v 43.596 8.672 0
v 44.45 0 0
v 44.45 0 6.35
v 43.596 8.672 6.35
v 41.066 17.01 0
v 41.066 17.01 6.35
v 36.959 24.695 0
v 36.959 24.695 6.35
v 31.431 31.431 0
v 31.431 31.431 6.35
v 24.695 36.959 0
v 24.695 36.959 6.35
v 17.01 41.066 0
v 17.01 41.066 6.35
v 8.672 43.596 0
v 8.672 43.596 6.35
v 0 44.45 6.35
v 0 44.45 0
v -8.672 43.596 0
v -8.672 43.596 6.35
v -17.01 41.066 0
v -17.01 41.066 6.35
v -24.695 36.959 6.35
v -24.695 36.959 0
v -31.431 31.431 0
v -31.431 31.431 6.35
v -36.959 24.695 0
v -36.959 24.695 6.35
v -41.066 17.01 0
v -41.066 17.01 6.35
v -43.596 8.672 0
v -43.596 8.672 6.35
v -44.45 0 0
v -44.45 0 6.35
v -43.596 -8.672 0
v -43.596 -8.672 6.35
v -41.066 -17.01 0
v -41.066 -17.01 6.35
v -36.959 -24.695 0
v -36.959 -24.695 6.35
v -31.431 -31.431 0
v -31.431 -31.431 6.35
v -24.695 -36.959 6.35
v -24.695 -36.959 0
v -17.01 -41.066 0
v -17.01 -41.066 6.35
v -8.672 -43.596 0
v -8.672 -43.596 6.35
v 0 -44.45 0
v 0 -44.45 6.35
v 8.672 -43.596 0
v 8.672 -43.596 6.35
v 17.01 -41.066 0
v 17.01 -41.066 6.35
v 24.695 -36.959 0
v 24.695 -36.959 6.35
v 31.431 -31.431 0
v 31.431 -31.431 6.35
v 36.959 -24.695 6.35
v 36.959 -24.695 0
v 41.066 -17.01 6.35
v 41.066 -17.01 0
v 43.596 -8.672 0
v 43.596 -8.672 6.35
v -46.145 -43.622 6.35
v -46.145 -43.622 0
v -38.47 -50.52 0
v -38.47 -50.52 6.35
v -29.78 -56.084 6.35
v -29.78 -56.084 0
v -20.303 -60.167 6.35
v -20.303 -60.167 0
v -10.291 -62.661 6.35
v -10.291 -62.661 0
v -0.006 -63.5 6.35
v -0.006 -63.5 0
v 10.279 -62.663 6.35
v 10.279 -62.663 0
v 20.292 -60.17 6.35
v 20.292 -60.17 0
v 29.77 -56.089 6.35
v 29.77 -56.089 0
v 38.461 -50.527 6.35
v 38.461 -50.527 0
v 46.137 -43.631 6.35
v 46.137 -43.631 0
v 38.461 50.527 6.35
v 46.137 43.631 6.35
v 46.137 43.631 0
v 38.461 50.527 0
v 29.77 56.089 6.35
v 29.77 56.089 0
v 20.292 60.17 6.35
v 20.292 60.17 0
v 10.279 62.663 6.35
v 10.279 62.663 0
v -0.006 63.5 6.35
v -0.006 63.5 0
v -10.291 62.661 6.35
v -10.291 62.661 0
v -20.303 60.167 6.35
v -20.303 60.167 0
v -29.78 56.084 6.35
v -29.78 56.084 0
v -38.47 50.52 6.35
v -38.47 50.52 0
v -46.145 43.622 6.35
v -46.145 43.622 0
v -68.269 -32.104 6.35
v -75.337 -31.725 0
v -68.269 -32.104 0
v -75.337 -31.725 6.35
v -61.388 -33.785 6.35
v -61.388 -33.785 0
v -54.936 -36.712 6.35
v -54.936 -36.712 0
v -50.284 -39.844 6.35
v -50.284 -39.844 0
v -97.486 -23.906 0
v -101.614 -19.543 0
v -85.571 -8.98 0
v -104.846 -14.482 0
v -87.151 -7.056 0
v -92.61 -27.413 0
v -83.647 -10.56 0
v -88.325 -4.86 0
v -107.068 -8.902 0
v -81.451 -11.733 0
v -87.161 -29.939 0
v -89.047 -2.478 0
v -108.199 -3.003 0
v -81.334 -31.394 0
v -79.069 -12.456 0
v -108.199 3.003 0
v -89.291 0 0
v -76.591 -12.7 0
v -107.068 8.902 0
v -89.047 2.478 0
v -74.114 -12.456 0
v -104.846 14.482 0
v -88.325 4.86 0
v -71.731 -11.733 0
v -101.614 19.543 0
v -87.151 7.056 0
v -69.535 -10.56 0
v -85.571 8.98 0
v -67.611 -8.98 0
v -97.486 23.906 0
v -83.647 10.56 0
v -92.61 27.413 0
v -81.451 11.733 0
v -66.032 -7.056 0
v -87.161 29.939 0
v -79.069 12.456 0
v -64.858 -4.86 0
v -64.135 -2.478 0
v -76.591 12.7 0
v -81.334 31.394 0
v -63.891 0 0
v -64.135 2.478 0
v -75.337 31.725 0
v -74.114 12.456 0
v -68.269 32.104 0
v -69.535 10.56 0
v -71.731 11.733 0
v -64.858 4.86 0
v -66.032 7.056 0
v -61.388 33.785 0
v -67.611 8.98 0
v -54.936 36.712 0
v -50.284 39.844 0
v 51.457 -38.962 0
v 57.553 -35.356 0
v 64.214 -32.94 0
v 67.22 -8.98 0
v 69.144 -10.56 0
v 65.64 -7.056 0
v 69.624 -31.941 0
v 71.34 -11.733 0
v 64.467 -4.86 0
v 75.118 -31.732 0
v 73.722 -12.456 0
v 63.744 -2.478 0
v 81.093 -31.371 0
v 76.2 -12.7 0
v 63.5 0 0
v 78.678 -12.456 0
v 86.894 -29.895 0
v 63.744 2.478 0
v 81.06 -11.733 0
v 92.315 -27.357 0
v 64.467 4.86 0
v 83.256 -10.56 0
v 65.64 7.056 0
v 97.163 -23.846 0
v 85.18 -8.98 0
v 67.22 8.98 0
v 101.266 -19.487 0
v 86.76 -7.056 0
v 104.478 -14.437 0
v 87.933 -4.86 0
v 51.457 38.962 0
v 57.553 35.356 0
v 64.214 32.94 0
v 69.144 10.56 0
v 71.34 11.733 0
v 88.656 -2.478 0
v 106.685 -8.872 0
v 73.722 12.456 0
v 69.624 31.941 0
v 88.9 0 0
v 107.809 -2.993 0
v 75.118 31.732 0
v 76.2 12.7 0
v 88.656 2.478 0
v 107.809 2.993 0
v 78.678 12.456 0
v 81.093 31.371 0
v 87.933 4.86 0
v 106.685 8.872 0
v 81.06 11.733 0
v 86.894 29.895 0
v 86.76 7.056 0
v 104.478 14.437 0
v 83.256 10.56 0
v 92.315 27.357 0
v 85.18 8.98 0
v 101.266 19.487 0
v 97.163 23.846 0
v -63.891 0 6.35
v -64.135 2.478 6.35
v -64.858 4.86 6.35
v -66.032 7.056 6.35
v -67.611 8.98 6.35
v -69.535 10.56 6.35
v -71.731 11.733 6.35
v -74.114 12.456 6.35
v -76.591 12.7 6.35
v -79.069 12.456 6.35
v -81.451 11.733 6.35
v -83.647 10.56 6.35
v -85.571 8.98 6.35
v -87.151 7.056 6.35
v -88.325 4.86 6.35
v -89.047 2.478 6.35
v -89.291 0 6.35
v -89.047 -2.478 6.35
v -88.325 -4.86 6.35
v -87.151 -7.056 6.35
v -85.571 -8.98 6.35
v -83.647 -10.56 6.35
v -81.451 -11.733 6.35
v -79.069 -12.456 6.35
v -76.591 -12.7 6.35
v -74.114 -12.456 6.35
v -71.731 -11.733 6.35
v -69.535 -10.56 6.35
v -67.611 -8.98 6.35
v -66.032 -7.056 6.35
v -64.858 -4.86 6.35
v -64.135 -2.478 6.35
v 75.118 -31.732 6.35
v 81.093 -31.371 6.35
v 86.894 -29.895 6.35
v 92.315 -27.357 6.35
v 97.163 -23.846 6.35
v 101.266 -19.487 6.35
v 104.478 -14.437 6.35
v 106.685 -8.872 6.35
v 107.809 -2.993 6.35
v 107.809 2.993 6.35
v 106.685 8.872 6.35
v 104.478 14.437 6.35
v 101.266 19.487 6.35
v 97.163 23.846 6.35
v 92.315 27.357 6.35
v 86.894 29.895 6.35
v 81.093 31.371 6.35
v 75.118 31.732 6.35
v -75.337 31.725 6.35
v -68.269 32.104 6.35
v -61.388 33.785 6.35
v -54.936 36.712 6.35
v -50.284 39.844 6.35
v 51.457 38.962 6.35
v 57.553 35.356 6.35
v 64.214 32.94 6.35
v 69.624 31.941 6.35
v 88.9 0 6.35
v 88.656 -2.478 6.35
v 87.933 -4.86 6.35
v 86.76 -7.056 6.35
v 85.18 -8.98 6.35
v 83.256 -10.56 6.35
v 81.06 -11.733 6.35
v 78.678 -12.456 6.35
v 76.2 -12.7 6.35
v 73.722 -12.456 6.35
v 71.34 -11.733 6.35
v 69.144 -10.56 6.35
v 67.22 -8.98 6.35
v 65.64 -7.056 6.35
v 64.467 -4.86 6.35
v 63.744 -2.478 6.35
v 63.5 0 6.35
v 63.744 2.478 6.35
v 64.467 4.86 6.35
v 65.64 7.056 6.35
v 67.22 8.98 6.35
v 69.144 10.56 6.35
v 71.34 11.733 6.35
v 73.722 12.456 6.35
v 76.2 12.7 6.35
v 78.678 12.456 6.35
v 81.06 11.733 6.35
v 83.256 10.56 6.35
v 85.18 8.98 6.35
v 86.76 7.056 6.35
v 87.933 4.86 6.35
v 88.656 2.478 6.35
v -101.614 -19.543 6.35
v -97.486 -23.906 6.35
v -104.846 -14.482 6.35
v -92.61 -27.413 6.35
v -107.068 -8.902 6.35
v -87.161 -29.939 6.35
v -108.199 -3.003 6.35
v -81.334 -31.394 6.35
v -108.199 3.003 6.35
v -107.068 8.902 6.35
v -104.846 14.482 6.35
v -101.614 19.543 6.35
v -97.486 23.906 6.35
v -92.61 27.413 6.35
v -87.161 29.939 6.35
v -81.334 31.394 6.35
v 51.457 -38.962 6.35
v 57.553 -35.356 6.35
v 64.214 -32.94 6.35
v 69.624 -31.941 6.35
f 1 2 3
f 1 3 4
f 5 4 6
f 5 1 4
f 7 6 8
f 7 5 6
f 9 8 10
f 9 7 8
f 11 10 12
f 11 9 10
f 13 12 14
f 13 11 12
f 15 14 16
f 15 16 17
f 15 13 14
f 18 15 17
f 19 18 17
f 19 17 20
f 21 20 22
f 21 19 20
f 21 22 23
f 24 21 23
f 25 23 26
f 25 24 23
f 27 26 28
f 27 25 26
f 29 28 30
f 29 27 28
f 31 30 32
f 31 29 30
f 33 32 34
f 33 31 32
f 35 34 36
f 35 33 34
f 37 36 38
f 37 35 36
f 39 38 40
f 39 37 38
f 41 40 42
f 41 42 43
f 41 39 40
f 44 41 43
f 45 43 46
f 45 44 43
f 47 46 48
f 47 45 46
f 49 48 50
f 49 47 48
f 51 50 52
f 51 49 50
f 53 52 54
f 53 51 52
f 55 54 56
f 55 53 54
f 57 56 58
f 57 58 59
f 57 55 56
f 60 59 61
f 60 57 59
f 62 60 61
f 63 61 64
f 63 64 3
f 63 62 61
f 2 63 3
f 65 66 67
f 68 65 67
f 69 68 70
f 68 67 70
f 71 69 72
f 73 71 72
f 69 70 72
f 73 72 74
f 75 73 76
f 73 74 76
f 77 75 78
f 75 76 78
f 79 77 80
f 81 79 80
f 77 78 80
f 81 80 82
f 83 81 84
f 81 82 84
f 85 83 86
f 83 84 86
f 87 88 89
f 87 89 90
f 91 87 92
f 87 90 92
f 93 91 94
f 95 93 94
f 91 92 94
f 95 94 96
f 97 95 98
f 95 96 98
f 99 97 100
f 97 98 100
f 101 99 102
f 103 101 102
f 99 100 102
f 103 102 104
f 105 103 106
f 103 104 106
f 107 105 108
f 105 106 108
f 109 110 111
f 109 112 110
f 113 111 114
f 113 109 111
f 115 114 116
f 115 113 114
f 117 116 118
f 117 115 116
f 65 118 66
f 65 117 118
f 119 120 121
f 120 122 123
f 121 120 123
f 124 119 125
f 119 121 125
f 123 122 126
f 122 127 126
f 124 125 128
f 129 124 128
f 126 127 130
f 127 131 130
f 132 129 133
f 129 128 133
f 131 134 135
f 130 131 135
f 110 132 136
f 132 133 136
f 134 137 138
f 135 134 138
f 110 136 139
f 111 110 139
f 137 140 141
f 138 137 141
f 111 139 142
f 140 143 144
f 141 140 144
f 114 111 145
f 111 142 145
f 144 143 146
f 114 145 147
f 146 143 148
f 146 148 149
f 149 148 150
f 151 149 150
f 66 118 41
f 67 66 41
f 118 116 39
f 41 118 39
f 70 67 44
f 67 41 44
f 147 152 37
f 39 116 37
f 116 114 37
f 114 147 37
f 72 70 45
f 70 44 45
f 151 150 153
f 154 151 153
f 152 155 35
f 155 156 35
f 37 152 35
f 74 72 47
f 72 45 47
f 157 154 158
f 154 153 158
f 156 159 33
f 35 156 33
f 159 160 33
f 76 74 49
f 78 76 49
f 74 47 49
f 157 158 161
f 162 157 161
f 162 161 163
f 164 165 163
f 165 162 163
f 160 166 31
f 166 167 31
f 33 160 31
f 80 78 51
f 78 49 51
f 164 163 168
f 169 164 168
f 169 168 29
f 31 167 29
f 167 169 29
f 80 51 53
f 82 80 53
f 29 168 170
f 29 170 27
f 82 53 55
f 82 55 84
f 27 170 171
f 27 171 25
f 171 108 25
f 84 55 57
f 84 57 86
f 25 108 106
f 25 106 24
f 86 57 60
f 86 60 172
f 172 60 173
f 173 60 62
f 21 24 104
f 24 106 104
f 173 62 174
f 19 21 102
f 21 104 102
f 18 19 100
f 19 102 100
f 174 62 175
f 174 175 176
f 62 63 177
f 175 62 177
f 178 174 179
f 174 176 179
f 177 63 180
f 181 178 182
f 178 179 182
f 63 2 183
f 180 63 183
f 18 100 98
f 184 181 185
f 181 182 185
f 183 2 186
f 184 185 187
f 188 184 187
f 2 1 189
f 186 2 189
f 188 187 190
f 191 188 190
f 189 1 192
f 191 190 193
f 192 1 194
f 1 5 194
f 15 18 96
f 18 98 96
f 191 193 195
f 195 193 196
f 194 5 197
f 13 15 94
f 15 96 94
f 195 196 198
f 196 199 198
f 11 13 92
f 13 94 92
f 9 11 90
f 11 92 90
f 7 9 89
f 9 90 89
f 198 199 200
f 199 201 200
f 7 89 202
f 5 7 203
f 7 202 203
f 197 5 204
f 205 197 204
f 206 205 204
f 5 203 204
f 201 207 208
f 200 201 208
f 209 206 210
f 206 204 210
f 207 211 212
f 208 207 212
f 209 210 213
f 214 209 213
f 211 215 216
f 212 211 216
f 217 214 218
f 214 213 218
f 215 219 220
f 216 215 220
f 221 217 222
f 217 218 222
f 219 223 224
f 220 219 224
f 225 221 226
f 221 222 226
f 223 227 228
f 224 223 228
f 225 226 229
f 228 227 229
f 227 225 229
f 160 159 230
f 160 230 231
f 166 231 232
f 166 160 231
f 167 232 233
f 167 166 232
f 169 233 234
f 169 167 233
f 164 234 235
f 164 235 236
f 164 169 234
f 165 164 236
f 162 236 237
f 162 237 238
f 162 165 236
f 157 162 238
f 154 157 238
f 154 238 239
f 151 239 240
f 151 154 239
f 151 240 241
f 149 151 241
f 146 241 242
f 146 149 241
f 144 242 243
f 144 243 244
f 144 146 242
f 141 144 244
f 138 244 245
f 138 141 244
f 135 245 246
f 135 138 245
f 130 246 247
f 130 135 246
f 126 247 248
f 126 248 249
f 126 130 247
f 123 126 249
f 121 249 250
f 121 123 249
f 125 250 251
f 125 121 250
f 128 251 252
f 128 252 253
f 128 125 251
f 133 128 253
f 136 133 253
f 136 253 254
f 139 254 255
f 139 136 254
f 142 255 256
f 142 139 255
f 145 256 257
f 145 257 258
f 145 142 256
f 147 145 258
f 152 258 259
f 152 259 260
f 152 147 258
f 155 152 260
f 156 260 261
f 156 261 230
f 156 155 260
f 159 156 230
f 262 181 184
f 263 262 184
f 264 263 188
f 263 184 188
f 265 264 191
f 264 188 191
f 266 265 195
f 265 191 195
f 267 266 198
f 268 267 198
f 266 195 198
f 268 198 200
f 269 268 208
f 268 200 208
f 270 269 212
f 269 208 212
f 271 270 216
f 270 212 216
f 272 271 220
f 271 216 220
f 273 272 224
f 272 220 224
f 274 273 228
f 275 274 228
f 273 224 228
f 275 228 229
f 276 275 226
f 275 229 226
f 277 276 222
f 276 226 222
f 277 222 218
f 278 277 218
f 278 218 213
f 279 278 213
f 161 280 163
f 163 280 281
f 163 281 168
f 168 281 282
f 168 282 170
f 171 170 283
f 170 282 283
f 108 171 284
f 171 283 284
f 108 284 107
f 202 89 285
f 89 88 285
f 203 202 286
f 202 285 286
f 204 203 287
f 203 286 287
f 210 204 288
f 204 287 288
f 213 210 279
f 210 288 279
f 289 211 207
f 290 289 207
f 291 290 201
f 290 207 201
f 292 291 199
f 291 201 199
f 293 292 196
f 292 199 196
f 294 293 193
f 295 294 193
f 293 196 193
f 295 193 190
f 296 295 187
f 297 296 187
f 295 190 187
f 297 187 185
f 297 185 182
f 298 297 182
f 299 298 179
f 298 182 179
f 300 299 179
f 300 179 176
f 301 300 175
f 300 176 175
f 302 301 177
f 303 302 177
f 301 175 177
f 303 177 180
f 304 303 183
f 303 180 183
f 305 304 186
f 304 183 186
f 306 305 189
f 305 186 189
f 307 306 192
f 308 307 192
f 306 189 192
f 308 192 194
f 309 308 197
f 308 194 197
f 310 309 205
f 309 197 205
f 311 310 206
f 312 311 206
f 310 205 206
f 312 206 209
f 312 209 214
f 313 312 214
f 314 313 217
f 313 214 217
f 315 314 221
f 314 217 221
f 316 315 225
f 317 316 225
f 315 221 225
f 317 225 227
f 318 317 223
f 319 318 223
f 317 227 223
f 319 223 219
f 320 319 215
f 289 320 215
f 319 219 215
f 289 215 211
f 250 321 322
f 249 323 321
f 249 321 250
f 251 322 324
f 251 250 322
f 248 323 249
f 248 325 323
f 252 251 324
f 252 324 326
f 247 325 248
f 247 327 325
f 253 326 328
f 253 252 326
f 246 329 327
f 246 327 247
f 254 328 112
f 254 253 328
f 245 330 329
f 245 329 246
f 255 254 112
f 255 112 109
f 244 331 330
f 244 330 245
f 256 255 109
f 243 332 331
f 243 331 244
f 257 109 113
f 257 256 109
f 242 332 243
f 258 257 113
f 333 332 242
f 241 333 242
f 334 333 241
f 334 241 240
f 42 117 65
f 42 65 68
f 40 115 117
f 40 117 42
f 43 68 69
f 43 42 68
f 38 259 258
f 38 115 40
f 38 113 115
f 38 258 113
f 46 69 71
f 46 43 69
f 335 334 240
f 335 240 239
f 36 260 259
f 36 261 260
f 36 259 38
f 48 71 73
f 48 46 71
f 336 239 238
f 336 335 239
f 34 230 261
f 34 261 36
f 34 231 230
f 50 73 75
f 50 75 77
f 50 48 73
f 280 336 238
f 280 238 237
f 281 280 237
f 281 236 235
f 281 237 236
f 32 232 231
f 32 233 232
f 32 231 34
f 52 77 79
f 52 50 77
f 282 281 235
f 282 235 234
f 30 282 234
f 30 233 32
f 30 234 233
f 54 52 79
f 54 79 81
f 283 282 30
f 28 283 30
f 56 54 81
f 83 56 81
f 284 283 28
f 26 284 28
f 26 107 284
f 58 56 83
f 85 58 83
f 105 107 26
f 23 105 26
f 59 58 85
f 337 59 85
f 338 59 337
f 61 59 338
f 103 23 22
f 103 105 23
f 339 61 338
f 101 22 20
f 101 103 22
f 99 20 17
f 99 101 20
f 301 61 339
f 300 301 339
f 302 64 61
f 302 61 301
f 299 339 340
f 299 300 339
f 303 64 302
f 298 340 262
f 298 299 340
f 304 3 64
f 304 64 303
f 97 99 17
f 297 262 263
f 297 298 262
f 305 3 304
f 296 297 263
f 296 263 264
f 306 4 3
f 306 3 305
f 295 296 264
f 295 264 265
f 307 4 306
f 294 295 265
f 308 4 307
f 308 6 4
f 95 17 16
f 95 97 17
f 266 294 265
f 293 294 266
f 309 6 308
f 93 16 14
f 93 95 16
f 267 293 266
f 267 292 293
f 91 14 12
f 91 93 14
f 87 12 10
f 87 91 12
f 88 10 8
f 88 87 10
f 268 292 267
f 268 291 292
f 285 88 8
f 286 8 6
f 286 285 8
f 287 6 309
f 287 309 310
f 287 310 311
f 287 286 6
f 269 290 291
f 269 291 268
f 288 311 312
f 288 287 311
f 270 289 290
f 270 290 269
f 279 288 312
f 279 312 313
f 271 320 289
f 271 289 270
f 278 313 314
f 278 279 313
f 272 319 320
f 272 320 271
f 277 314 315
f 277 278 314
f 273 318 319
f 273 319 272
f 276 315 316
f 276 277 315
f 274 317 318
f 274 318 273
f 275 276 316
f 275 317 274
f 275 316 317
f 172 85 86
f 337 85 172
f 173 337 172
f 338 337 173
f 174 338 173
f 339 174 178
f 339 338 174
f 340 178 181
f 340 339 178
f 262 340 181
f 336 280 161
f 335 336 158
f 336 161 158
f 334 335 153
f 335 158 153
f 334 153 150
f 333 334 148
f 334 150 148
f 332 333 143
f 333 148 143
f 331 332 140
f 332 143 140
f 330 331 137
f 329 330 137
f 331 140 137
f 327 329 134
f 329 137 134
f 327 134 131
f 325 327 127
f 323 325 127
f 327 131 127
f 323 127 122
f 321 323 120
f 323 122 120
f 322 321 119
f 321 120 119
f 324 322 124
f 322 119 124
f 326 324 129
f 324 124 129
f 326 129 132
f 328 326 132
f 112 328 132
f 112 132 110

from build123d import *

# Parameters (mm, degrees)
F0_R     = 12.7
F0_R_2   = 44.45
F1_DEPTH = 6.35
F2_R     = 38.1


with BuildPart() as f1:
    # F0 (on Top) → F1 (new body)
    with BuildSketch(Plane.XY):
        with BuildLine():
            ThreePointArc((-58.0380028326, -25.7650970735), (-63.5, 0), (-58.0380028326, 25.7650970735))
            ThreePointArc((-58.0380028326, 25.7650970735), (-108.3412309289, 0), (-58.0380028326, -25.7650970735))
        make_face()
        with Locations((-76.5912309289, 0)):
            Circle(F0_R, mode=Mode.SUBTRACT)
        with BuildLine():
            ThreePointArc((57.94375, -25.976370723), (62.0954029096, -13.2819779212), (63.5, 0))
            ThreePointArc((63.5, 0), (62.0954029096, 13.2819779212), (57.94375, 25.976370723))
            ThreePointArc((57.94375, 25.976370723), (-0.1156721136, 63.4998946453), (-58.0380028326, 25.7650970735))
            ThreePointArc((-58.0380028326, 25.7650970735), (-63.5, 0), (-58.0380028326, -25.7650970735))
            ThreePointArc((-58.0380028326, -25.7650970735), (-0.1156721136, -63.4998946453), (57.94375, -25.976370723))
        make_face()
        Circle(F0_R_2, mode=Mode.SUBTRACT)
        with BuildLine():
            ThreePointArc((57.94375, 25.976370723), (62.0954029096, 13.2819779212), (63.5, 0))
            ThreePointArc((63.5, 0), (62.0954029096, -13.2819779212), (57.94375, -25.976370723))
            ThreePointArc((57.94375, -25.976370723), (107.95, 0), (57.94375, 25.976370723))
        make_face()
        with BuildLine():
            ThreePointArc((63.5, 0), (76.2, 12.7), (88.9, 0))
            ThreePointArc((88.9, 0), (76.2, -12.7), (63.5, 0))
        make_face(mode=Mode.SUBTRACT)
    extrude(amount=F1_DEPTH)

    # F2
    f2_edges = [f1.edges().sort_by_distance(p)[0] for p in [
        (-58.038003, 25.765097, 3.175),
        (57.94375, -25.976371, 3.175),
        (-58.038003, -25.765097, 3.175),
        (57.94375, 25.976371, 3.175),
    ]]
    fillet(f2_edges, radius=F2_R)


solid = f1.part
